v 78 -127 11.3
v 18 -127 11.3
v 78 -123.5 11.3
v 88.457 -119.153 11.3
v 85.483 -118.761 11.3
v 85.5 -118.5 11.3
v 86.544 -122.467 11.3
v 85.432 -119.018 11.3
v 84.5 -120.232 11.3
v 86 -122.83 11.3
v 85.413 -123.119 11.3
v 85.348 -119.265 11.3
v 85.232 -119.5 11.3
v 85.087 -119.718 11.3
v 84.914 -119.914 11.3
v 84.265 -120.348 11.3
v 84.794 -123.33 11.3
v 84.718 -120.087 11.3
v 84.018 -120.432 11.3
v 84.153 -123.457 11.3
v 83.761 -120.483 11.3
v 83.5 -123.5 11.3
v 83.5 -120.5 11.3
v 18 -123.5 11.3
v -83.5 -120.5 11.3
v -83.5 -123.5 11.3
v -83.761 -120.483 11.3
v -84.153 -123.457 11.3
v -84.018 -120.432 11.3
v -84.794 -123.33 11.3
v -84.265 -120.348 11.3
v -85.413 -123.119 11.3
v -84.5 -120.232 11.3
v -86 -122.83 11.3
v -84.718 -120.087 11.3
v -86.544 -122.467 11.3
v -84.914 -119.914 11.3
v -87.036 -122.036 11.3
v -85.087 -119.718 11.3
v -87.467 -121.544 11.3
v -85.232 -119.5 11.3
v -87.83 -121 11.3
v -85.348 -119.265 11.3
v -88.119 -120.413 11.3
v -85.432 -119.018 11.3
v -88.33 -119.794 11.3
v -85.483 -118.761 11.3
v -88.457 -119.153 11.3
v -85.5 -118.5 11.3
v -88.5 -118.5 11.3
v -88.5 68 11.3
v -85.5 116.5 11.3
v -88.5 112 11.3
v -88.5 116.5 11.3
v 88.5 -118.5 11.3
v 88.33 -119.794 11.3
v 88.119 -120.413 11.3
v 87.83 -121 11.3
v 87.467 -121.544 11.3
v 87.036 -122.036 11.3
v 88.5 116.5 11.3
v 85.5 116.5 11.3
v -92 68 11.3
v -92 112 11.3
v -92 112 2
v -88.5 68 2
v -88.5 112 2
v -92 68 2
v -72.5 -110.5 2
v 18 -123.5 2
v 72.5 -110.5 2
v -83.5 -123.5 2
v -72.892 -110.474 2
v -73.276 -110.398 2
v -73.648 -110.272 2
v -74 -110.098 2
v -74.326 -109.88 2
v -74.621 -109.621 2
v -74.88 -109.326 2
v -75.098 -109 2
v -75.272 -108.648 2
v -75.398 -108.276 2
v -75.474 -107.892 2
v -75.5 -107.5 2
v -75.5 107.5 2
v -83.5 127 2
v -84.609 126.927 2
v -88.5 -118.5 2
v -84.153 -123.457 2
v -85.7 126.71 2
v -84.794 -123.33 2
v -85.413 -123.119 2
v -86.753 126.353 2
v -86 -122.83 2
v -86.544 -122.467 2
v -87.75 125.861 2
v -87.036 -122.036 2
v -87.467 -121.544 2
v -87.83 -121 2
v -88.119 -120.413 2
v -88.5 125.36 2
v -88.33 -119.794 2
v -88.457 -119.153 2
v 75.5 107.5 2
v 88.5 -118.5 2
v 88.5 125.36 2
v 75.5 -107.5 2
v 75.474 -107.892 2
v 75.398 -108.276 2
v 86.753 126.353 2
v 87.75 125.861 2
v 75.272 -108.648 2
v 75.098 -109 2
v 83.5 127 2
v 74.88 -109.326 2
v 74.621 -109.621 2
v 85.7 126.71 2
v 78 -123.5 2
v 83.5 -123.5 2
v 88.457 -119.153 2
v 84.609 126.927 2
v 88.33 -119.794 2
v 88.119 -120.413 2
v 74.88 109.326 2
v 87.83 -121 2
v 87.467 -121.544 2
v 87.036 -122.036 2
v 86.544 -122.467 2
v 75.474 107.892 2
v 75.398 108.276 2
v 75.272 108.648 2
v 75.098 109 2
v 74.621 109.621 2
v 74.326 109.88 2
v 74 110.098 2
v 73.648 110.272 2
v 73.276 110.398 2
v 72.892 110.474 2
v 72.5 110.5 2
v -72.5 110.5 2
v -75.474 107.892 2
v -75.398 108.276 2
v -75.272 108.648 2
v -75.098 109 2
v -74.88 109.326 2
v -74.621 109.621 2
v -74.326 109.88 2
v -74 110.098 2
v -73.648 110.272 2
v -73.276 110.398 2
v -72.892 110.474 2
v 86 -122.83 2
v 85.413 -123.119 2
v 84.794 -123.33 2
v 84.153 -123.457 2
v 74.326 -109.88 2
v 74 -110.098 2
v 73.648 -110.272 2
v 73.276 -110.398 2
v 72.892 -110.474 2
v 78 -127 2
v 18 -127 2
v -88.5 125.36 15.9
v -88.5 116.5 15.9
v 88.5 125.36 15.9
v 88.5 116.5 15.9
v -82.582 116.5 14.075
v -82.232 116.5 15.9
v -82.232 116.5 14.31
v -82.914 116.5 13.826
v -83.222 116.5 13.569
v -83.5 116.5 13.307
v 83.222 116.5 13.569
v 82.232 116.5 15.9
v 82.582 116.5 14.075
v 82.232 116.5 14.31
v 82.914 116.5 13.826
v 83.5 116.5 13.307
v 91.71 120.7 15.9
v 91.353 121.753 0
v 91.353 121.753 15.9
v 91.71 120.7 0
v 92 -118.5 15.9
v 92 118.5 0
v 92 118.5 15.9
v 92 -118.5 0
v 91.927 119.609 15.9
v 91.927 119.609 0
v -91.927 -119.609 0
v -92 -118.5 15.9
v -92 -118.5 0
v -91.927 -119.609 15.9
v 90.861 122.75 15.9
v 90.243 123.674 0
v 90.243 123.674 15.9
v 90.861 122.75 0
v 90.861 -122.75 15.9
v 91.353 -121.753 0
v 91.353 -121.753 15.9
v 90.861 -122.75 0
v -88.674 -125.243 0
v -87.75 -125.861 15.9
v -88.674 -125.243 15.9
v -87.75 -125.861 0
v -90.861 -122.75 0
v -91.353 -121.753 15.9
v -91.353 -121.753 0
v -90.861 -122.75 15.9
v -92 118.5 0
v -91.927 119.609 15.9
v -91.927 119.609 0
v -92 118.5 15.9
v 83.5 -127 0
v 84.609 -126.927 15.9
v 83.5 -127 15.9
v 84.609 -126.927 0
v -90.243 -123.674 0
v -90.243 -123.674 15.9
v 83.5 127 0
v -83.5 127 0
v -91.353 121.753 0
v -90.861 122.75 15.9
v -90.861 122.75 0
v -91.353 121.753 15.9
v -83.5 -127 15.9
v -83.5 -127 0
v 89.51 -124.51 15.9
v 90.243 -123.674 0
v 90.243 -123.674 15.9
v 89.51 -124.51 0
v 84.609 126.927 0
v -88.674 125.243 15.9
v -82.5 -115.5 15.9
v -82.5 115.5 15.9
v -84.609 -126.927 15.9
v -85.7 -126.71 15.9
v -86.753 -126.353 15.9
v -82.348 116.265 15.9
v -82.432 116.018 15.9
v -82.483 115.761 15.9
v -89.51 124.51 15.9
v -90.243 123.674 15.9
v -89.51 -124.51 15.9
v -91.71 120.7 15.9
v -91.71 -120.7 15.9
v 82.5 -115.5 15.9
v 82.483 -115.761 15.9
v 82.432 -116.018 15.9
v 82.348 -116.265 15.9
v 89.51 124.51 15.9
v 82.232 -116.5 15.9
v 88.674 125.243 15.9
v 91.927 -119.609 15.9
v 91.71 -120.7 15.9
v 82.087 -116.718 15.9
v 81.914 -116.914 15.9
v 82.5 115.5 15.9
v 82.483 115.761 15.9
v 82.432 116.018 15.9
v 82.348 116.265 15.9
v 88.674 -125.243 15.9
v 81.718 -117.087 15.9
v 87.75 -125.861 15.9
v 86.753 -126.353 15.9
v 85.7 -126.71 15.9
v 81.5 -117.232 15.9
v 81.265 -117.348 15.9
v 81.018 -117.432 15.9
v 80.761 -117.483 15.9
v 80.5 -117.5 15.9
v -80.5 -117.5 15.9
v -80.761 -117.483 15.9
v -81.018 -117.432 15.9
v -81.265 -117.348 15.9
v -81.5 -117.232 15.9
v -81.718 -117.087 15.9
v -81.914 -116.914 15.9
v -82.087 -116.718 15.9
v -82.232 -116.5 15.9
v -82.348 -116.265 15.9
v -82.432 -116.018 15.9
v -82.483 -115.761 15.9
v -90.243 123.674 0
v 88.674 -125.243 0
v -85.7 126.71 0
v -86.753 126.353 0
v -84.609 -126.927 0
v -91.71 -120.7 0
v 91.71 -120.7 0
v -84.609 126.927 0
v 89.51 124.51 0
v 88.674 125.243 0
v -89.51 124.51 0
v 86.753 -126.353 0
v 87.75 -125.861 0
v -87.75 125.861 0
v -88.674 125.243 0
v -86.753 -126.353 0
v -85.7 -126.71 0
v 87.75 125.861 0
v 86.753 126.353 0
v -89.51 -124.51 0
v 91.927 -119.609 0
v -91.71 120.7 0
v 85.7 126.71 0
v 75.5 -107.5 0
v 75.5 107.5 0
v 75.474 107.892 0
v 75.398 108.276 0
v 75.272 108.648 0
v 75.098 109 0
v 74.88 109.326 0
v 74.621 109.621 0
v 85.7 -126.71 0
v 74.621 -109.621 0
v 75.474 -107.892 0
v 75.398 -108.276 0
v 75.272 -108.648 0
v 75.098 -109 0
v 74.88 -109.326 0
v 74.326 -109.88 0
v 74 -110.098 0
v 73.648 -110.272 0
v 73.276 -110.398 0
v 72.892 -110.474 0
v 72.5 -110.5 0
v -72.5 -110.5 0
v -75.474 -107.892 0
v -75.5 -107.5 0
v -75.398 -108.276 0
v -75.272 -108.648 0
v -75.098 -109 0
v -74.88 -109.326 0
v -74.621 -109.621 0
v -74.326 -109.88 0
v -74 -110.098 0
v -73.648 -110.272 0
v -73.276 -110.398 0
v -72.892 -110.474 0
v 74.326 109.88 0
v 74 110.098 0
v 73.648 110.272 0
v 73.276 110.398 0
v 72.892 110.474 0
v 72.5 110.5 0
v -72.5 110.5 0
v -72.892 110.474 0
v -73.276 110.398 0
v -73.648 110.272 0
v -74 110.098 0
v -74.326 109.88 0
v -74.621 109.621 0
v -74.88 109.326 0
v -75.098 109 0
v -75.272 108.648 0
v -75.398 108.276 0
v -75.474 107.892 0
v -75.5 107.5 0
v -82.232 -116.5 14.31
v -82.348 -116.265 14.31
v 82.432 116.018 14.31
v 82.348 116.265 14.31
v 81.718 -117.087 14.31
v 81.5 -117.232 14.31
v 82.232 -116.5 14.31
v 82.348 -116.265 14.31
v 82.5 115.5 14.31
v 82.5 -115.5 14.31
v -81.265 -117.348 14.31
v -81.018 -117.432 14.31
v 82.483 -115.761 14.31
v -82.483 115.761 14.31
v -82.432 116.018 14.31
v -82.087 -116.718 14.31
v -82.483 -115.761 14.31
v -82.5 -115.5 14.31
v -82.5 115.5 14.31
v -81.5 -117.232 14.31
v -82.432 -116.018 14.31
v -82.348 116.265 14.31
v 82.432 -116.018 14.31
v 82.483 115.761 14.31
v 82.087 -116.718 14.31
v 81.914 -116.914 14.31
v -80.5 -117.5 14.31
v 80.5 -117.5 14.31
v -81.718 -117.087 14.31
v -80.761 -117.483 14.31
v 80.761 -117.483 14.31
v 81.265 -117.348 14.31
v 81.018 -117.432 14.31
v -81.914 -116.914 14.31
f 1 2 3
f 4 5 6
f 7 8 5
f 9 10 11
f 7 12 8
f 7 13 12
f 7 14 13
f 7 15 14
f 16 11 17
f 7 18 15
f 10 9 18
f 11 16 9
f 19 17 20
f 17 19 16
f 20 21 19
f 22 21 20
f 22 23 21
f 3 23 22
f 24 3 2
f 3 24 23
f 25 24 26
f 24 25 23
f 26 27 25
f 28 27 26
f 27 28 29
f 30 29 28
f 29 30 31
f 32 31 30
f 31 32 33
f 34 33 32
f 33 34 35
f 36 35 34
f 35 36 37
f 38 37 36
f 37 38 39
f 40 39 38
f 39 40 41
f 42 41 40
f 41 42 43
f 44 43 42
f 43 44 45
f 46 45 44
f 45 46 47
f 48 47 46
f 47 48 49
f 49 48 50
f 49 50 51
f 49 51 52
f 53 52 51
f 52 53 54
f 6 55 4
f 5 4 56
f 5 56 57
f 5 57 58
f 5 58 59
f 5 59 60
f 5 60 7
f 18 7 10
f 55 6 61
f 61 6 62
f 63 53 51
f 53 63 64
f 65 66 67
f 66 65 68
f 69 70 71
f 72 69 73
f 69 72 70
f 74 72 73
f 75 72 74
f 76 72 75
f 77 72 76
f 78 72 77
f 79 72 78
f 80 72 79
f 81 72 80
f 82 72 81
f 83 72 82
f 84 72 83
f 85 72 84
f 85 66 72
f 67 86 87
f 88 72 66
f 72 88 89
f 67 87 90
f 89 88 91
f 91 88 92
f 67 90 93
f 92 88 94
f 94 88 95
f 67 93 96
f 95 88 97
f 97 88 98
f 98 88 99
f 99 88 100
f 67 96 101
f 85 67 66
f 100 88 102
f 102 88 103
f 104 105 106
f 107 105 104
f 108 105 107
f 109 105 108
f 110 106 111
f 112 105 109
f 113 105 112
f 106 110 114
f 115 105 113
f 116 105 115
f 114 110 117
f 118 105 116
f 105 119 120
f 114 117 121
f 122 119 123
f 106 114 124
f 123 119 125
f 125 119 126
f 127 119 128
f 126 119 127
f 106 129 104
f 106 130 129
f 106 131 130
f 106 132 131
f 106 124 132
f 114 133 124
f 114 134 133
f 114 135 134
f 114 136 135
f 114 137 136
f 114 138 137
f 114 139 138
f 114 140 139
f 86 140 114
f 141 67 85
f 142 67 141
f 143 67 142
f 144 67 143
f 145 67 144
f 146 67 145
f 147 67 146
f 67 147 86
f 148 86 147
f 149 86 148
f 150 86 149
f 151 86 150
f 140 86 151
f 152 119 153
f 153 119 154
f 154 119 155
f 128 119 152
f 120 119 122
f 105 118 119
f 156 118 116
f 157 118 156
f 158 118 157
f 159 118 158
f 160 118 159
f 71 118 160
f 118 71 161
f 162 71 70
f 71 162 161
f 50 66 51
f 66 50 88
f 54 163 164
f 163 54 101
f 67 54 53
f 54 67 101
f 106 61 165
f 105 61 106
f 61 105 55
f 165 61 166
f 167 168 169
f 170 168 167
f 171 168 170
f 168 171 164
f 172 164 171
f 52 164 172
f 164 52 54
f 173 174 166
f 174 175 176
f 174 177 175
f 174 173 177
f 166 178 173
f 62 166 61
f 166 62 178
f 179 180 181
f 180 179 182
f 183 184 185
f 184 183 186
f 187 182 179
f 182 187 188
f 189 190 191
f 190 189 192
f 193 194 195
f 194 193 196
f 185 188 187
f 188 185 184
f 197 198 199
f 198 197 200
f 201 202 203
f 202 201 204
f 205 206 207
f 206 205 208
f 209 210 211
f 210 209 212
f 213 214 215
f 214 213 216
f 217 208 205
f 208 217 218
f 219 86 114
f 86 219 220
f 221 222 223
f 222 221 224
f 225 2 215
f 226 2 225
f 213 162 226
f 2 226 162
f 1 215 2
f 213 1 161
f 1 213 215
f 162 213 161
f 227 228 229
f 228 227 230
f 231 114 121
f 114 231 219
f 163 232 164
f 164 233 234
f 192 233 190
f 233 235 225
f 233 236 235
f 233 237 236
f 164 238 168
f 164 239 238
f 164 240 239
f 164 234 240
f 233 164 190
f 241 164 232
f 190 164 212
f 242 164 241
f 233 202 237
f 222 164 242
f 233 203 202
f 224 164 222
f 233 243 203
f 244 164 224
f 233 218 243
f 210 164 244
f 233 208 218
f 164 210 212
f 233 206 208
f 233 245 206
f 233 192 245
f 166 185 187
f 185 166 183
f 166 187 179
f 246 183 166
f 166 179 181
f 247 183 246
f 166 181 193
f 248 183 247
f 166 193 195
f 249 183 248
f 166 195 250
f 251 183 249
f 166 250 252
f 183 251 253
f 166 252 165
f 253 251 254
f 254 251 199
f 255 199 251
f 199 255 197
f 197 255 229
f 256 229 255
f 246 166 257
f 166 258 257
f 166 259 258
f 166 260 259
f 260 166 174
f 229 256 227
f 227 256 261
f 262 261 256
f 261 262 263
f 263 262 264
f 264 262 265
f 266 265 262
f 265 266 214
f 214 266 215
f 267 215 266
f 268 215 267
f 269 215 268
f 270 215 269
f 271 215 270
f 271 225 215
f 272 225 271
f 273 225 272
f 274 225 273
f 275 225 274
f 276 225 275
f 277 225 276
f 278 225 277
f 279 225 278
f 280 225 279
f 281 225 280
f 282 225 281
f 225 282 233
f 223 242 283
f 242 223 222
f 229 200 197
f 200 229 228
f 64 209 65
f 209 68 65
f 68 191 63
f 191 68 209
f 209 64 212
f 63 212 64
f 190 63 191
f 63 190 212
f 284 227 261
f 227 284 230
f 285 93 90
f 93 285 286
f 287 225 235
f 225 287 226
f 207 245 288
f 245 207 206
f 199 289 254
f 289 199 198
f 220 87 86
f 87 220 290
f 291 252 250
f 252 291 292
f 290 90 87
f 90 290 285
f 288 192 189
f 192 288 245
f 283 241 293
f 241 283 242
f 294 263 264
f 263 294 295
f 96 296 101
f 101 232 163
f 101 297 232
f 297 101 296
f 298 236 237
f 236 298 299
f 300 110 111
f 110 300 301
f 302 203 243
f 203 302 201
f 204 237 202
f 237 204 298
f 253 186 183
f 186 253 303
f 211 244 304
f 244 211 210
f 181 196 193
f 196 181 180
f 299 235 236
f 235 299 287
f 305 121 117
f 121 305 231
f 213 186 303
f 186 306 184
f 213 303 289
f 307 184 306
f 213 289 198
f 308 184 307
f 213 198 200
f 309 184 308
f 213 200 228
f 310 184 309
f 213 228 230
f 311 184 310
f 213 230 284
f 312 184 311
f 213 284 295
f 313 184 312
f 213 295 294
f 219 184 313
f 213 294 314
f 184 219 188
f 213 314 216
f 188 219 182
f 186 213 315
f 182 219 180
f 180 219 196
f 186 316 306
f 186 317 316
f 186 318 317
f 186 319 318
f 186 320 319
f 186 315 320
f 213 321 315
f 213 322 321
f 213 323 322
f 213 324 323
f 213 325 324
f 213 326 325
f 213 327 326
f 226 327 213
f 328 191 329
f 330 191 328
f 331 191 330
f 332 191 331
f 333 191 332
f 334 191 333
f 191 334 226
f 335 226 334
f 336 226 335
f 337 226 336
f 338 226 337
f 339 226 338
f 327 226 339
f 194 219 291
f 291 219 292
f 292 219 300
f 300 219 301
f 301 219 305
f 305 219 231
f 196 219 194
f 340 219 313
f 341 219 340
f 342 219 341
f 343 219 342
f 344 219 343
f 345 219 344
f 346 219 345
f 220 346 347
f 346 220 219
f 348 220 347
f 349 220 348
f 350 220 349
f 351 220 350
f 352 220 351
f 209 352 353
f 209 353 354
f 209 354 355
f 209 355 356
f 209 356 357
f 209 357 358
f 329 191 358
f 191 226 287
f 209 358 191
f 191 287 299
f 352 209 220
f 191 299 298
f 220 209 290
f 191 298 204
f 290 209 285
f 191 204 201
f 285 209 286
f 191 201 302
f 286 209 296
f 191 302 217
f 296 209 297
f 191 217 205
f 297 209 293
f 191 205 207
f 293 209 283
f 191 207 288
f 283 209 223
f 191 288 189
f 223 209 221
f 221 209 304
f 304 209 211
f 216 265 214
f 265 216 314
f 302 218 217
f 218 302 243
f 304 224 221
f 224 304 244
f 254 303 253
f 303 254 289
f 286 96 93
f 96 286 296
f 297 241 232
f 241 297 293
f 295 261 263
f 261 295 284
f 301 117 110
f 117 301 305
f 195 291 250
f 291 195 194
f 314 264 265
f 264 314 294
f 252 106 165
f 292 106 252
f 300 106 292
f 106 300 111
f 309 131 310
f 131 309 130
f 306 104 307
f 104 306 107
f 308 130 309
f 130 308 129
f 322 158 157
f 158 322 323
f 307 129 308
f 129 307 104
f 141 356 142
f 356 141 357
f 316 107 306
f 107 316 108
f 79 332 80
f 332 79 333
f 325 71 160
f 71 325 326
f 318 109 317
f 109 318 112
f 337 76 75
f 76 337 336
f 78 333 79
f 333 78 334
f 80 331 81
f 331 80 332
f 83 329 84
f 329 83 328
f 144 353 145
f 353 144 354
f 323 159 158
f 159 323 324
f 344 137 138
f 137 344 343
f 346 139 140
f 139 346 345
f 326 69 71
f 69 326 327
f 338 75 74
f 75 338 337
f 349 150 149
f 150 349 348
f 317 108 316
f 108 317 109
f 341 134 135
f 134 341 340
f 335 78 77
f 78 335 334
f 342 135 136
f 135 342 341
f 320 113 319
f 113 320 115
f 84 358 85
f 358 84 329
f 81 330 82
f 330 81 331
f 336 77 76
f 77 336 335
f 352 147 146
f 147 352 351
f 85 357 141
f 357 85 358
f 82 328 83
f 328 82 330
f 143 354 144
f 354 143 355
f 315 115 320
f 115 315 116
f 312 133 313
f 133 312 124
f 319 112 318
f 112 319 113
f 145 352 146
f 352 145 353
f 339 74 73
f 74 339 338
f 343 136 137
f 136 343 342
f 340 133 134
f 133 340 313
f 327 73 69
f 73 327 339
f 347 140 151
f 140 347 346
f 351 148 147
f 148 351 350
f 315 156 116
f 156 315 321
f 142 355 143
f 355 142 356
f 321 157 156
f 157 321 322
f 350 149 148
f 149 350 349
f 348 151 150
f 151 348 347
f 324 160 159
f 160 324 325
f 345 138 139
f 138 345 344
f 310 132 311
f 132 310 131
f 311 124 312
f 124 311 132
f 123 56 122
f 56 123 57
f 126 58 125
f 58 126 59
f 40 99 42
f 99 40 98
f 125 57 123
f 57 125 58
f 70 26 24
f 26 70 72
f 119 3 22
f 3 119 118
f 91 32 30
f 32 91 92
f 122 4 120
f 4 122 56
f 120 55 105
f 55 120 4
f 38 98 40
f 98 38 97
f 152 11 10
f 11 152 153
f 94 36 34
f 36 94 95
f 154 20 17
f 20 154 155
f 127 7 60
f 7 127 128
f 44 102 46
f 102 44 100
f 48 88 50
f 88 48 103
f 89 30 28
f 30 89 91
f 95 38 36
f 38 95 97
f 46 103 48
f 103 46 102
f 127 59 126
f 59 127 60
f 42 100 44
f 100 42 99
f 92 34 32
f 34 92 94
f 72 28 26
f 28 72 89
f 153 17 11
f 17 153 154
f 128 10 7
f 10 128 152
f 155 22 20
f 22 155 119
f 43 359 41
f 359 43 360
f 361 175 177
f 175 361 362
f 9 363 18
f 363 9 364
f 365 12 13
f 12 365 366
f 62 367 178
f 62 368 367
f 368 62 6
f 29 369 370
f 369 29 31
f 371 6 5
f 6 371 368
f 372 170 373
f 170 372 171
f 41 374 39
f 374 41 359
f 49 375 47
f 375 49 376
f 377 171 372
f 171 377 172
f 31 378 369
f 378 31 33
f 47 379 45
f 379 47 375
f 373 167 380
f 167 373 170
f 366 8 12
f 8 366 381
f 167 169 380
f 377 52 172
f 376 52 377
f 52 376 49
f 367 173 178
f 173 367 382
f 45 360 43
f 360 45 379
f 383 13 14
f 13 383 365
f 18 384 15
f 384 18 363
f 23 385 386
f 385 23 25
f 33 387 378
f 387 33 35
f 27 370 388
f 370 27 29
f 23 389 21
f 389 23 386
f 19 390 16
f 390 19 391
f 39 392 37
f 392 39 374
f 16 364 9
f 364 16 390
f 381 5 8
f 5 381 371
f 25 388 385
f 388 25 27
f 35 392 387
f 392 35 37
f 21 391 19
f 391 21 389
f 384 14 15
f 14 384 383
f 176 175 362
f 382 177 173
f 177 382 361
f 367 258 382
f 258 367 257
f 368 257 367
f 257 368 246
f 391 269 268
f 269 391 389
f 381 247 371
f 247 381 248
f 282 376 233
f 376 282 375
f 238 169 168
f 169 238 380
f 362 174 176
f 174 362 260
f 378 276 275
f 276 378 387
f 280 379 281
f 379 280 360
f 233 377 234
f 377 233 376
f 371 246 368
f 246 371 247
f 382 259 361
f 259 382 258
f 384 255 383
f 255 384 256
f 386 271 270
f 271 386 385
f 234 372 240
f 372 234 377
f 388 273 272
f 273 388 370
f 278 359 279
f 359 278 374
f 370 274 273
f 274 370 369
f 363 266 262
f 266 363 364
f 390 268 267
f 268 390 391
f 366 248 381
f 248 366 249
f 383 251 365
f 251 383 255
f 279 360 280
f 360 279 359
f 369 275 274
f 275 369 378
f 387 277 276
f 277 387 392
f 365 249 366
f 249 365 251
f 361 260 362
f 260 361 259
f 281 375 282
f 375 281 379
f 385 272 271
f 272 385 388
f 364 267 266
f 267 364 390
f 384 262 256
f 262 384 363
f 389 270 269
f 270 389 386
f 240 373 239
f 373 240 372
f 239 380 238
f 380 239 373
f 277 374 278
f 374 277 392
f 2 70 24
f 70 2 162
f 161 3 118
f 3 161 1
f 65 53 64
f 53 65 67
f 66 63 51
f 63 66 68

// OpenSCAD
// Portrait version of the slide-in Surface Go window frame: open on a short
// edge at the top, charger slot at the bottom. Shown as it hangs.
// Dimensions come from ../surface-go-window-frame.scad.
use <../surface-go-window-frame.scad>

frame_portrait();
